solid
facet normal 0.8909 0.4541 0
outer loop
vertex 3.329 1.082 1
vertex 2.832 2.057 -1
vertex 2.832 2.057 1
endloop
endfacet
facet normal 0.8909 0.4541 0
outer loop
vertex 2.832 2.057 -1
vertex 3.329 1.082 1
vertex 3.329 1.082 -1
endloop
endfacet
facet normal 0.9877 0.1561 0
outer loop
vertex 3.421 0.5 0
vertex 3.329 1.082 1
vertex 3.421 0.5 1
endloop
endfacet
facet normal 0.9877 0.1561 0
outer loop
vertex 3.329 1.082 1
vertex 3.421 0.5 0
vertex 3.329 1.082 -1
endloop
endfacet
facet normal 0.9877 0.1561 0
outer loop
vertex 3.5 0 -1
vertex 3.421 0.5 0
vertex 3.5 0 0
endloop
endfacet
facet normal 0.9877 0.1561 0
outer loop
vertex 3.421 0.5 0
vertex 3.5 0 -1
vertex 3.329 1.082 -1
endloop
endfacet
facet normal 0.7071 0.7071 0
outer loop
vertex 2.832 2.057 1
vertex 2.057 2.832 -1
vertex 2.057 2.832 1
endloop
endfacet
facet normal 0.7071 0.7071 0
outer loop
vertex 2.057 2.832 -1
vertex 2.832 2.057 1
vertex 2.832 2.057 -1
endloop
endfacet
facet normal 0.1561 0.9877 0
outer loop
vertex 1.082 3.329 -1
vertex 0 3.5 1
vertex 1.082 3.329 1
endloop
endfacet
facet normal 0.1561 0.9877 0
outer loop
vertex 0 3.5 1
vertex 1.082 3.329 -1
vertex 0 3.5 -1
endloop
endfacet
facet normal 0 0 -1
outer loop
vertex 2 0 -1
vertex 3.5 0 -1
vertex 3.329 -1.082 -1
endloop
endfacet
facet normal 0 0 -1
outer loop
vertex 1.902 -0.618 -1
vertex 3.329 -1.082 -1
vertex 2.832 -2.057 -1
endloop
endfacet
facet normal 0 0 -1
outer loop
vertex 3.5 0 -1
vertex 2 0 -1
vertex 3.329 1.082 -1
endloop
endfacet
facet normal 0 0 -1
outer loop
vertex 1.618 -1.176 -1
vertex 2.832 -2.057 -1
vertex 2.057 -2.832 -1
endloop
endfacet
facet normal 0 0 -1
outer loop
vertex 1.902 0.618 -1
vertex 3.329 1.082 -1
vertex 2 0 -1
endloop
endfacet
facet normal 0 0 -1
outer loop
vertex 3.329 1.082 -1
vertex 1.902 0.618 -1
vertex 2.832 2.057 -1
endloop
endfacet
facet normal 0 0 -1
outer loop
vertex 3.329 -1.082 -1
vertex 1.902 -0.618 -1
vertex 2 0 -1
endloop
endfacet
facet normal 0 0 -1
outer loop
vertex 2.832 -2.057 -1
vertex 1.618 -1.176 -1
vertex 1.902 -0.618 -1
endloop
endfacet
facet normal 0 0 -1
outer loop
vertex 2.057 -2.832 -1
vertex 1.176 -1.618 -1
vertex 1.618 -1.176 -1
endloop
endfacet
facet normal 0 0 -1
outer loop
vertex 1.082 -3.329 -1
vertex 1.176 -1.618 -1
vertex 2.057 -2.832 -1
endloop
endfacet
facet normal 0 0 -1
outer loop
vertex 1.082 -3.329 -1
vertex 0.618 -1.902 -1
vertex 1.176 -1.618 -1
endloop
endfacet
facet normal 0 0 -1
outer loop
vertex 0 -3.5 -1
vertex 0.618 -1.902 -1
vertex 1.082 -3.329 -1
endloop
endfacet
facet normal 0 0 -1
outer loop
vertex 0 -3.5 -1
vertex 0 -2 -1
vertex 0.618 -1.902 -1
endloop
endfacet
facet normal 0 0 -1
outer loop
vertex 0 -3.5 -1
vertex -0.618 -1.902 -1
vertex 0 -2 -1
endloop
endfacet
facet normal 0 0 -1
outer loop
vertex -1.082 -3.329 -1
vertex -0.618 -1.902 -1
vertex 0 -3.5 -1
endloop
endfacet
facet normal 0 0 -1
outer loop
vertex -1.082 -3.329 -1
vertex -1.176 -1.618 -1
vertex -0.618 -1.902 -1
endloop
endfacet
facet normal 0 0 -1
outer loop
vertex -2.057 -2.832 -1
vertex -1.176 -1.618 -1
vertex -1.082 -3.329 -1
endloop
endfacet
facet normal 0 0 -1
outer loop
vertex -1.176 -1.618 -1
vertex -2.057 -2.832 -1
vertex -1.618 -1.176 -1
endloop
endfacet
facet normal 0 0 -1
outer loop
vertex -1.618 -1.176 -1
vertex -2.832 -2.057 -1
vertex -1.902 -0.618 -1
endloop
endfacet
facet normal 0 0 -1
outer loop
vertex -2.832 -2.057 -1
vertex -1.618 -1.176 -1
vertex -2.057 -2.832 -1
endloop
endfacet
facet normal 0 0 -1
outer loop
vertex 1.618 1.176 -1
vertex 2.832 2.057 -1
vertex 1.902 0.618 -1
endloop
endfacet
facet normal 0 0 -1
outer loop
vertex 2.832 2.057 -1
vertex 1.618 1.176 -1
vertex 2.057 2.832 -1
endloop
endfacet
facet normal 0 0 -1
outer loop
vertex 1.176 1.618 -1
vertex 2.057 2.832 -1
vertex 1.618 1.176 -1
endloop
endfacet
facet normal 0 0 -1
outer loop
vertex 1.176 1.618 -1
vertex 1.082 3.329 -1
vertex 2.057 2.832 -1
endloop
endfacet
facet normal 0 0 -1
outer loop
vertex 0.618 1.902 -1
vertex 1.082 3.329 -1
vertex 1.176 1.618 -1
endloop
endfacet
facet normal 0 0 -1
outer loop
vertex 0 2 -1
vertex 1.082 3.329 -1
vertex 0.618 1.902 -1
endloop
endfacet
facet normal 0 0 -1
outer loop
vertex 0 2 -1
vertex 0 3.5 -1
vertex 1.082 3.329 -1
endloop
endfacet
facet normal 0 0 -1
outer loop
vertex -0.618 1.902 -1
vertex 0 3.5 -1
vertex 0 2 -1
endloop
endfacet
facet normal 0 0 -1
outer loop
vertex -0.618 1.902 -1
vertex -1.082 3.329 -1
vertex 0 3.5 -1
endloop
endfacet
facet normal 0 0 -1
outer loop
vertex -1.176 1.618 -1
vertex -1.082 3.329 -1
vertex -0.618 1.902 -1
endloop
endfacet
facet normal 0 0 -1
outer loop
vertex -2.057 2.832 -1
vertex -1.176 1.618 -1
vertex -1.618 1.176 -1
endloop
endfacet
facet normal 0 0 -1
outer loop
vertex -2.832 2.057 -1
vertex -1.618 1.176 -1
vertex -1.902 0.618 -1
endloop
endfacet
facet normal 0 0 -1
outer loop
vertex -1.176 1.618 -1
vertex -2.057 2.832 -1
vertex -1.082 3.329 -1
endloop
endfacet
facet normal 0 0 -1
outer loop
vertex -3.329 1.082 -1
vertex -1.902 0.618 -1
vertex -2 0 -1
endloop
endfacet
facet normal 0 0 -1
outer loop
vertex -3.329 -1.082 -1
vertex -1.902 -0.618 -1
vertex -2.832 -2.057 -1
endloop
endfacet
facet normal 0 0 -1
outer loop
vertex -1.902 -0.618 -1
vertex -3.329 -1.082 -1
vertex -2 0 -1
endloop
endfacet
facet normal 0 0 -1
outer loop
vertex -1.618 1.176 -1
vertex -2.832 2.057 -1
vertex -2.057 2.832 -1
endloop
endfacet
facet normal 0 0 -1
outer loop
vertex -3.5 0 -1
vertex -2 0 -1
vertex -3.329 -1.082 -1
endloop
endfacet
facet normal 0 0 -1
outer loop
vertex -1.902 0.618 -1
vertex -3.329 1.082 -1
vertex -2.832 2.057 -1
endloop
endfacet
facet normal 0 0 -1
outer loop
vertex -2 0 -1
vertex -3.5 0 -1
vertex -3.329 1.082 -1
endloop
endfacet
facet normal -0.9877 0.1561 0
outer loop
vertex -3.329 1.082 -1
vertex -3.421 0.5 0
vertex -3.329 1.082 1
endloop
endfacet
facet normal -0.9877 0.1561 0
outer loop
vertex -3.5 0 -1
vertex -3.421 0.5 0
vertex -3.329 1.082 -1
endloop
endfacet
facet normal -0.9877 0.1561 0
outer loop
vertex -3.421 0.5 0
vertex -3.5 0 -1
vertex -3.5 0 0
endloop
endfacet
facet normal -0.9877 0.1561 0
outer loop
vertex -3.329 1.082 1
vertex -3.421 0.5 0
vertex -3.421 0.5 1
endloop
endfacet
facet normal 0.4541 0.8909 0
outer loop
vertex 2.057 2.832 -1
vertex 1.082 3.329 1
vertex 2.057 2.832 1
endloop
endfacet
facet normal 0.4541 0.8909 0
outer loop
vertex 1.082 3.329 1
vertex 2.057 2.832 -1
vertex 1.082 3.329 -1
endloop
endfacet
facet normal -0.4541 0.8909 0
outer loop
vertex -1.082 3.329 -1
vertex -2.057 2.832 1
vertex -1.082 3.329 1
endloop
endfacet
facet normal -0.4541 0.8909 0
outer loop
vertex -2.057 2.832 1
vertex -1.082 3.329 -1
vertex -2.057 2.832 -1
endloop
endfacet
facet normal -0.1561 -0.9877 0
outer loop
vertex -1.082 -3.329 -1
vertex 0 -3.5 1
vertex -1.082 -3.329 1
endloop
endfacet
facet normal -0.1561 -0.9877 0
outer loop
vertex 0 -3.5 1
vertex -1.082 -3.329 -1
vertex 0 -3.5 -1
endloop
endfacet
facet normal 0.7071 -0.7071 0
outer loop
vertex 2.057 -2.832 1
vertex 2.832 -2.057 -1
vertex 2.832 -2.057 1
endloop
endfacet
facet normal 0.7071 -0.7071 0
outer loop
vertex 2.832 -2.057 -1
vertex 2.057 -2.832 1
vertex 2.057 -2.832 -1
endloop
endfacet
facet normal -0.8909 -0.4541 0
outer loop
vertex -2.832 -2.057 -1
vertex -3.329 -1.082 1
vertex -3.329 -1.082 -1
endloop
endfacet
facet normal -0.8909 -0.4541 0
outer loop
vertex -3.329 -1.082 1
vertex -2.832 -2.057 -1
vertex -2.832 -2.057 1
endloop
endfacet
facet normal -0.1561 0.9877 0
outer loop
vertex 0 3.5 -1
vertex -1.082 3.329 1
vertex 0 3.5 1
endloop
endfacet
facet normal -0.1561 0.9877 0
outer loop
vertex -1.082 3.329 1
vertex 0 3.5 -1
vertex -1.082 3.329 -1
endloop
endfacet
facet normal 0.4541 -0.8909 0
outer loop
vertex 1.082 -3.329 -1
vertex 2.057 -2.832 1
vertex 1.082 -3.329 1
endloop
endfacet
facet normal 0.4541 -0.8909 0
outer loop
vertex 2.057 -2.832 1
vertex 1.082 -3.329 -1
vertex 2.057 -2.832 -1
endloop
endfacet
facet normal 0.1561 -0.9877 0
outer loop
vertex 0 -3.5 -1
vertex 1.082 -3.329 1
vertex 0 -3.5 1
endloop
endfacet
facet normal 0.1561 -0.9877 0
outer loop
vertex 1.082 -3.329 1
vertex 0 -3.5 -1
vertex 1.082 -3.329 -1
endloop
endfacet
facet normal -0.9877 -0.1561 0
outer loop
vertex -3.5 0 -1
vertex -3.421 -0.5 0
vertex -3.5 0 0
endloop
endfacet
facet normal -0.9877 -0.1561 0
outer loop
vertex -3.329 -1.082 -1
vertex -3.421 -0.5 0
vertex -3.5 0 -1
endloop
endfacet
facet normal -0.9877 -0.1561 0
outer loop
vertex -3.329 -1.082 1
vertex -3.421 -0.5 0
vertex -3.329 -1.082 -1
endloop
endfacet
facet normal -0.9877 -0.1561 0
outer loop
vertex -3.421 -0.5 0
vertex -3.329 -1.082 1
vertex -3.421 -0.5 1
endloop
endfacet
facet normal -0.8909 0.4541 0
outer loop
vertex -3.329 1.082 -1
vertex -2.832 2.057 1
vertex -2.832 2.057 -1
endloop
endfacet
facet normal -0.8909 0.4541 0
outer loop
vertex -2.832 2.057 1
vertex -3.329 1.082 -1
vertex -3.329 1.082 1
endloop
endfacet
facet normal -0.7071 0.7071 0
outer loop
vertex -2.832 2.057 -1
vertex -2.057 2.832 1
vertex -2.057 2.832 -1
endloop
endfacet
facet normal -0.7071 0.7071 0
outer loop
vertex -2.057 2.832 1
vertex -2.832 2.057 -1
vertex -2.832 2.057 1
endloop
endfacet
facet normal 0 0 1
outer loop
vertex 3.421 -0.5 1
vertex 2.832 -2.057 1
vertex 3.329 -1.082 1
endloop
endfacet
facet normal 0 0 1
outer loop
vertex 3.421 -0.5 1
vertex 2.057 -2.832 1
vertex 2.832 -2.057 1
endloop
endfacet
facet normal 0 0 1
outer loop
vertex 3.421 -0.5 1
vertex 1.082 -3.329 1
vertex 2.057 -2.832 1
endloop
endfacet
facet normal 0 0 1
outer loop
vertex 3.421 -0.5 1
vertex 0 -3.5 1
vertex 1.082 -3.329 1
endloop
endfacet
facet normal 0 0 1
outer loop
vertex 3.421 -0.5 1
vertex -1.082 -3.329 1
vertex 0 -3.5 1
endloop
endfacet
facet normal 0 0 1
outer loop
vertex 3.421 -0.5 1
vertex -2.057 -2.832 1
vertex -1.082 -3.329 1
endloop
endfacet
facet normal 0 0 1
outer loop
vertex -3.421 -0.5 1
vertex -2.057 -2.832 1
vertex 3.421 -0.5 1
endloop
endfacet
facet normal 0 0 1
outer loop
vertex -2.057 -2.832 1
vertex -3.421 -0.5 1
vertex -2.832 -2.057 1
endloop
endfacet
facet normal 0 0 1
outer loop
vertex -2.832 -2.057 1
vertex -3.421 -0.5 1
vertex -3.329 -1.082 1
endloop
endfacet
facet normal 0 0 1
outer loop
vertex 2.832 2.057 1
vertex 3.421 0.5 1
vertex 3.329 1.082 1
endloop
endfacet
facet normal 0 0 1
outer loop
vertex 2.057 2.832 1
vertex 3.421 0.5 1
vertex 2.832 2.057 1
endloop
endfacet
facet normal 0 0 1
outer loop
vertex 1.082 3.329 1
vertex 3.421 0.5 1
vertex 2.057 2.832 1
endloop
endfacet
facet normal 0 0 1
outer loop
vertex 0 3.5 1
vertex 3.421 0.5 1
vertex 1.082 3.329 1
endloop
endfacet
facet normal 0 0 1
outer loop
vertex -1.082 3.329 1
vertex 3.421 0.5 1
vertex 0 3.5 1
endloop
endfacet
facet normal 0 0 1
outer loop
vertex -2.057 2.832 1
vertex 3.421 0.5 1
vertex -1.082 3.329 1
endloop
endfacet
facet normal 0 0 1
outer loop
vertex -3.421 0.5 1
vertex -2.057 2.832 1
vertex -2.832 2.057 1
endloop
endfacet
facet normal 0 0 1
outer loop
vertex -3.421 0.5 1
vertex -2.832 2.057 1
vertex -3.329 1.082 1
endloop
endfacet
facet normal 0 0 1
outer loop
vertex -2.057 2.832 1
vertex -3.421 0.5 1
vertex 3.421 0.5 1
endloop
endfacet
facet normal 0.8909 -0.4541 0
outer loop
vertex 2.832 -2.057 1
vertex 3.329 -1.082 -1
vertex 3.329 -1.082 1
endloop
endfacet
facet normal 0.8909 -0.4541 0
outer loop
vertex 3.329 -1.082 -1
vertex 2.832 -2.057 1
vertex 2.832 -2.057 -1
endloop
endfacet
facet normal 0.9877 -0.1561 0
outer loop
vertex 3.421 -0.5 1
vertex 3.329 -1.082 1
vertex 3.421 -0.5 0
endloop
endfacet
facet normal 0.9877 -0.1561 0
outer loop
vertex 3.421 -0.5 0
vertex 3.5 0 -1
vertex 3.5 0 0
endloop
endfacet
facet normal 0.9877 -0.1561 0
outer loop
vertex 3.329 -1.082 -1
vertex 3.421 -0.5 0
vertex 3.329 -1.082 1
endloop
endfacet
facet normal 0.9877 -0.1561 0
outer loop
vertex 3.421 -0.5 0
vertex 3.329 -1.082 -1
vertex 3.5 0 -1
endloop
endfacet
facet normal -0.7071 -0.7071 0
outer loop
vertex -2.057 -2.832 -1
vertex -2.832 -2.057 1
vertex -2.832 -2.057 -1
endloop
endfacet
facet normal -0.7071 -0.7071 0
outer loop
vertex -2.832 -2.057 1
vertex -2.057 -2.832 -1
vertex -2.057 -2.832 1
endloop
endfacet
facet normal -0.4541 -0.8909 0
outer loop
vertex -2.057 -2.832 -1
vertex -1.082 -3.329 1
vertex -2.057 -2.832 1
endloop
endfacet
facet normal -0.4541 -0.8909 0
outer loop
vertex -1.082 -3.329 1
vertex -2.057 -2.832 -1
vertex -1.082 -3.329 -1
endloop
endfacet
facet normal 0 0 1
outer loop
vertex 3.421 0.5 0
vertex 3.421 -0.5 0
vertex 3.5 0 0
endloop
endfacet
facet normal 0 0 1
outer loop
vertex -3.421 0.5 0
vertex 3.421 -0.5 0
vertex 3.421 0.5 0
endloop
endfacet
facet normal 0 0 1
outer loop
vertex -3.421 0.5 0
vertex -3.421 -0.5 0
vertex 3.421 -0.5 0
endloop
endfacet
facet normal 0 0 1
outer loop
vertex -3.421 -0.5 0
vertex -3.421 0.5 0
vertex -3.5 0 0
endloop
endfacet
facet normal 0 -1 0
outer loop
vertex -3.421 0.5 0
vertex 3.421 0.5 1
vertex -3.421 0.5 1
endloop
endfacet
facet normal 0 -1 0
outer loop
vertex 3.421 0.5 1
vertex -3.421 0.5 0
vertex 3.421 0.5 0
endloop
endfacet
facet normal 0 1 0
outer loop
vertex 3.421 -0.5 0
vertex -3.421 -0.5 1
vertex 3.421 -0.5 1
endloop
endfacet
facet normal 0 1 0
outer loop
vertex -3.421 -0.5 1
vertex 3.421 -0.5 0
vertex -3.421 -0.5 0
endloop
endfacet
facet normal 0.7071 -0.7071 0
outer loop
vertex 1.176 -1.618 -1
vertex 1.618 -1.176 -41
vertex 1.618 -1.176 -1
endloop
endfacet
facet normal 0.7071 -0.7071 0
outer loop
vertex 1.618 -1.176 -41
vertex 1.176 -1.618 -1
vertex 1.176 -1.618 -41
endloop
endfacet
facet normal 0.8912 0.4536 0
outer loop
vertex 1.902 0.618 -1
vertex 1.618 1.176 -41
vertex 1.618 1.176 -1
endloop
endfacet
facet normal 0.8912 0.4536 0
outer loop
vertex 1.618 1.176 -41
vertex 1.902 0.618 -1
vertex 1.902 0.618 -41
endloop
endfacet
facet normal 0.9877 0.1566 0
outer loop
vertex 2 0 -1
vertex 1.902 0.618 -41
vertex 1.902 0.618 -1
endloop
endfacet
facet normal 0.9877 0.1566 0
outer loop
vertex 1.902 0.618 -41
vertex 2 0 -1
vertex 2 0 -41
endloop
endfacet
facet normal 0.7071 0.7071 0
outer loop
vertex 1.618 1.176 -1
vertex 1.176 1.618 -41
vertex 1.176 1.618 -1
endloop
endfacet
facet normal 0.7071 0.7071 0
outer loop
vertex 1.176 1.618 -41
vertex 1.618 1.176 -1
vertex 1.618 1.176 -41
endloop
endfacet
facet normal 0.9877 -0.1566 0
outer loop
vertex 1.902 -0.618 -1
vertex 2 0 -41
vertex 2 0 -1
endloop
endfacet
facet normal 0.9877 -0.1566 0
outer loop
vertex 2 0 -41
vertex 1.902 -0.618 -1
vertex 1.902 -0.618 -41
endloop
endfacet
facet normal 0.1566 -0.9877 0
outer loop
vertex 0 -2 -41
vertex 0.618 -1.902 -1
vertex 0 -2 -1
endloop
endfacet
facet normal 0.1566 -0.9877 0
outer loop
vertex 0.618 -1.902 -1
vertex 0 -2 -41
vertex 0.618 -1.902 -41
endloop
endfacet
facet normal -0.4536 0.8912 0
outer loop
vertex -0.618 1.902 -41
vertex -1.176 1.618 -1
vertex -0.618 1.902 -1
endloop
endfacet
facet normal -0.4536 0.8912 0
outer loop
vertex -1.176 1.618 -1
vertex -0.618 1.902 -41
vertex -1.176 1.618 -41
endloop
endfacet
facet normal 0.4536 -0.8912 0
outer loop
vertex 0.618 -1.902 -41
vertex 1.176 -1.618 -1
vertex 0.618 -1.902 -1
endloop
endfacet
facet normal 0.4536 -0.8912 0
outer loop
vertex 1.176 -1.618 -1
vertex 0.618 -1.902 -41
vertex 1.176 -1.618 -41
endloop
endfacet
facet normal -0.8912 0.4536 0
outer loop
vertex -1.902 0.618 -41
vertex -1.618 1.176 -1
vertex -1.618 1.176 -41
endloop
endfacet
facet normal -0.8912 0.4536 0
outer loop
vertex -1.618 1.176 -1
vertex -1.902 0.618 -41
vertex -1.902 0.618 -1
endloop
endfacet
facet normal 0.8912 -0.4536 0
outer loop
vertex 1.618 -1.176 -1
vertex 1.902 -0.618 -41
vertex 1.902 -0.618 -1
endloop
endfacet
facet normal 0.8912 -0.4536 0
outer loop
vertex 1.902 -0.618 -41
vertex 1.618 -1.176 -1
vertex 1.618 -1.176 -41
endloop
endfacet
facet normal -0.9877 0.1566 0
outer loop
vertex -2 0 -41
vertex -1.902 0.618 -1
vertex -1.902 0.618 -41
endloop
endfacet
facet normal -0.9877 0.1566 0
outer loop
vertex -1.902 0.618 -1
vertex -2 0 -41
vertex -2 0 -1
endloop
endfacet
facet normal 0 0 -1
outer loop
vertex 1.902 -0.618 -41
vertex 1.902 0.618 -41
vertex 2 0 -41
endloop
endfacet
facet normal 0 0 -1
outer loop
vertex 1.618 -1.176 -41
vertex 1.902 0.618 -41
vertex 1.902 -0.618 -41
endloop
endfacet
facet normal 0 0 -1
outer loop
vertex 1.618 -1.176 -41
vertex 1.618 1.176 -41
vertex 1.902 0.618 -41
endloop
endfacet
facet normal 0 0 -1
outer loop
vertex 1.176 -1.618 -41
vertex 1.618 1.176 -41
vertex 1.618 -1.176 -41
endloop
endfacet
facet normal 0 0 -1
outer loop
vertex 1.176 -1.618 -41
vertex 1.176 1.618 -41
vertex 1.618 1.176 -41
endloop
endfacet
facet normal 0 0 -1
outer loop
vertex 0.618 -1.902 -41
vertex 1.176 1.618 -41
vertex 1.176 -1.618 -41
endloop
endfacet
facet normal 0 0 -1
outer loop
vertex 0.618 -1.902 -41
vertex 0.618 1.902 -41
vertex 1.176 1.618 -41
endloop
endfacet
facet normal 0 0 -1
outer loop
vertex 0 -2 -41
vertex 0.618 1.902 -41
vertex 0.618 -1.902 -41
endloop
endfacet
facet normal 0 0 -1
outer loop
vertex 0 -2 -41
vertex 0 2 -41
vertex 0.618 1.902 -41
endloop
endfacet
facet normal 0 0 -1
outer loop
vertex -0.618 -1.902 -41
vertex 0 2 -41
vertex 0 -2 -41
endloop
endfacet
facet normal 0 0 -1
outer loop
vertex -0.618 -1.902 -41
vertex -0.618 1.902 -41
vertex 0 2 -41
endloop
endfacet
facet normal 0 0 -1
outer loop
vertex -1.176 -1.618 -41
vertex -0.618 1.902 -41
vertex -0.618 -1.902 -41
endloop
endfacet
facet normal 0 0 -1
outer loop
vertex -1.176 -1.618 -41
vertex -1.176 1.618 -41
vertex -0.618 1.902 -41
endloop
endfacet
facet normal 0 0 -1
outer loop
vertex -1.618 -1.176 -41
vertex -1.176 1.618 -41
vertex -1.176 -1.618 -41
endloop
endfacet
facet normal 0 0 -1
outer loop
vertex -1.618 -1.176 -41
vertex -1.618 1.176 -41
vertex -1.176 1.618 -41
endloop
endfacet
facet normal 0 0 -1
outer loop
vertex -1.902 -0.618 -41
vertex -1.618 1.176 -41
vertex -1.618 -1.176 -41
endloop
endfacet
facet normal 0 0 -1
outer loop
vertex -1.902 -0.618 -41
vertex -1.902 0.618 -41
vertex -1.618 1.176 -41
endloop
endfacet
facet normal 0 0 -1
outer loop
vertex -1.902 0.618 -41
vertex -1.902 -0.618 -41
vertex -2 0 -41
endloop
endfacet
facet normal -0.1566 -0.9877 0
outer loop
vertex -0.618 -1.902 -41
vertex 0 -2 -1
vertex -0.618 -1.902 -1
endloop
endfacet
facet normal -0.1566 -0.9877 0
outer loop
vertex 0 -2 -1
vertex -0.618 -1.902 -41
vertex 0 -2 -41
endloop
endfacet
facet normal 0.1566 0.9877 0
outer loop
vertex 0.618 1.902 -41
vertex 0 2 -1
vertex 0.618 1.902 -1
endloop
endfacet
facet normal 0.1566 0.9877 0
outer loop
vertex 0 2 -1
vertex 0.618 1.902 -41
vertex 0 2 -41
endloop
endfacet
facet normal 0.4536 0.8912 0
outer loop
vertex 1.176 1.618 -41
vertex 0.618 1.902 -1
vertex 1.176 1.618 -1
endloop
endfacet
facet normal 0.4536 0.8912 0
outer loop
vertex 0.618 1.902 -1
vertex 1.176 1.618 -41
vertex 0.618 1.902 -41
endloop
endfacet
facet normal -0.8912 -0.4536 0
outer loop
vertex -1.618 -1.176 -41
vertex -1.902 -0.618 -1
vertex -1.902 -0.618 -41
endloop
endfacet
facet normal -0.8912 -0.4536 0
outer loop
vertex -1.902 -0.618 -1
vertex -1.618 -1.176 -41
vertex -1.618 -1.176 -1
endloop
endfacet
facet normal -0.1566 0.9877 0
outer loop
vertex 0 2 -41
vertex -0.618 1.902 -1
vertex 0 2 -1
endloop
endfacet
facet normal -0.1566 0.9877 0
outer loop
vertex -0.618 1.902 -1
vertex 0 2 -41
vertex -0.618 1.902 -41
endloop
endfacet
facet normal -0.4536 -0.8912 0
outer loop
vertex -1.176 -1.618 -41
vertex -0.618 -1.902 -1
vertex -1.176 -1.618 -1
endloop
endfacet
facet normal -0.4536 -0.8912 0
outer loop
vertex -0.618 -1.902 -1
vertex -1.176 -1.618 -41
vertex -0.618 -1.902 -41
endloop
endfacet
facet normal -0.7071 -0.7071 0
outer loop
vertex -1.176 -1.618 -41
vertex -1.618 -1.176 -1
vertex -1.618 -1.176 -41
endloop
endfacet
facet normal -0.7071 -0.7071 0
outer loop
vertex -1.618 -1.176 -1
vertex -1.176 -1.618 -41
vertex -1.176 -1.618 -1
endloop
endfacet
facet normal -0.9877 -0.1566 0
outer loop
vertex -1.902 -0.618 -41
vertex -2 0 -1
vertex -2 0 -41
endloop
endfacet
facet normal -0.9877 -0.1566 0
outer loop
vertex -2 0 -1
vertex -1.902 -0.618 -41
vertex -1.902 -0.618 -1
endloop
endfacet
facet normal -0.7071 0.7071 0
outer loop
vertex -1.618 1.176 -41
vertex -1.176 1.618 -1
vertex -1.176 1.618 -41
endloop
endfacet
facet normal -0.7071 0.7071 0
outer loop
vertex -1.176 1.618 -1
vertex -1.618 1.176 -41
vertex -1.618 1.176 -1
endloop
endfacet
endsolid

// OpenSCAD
length=40;

//-- M3
/*
drill=3;
head_thickness=1.5;
head_diameter=5;
*/

//-- M4
drill=4;
head_thickness=2;
head_diameter=7;

union() {
  translate([0,0,-length/2-head_thickness/2])
  cylinder(h=length, r=drill/2,center=true, $fn=20);

  difference() {
    cylinder(h=head_thickness, r=head_diameter/2, $fn=20, center=true);

     translate([0,0,5])
        cube([head_diameter+2, 1,10],center=true);
  }
}
